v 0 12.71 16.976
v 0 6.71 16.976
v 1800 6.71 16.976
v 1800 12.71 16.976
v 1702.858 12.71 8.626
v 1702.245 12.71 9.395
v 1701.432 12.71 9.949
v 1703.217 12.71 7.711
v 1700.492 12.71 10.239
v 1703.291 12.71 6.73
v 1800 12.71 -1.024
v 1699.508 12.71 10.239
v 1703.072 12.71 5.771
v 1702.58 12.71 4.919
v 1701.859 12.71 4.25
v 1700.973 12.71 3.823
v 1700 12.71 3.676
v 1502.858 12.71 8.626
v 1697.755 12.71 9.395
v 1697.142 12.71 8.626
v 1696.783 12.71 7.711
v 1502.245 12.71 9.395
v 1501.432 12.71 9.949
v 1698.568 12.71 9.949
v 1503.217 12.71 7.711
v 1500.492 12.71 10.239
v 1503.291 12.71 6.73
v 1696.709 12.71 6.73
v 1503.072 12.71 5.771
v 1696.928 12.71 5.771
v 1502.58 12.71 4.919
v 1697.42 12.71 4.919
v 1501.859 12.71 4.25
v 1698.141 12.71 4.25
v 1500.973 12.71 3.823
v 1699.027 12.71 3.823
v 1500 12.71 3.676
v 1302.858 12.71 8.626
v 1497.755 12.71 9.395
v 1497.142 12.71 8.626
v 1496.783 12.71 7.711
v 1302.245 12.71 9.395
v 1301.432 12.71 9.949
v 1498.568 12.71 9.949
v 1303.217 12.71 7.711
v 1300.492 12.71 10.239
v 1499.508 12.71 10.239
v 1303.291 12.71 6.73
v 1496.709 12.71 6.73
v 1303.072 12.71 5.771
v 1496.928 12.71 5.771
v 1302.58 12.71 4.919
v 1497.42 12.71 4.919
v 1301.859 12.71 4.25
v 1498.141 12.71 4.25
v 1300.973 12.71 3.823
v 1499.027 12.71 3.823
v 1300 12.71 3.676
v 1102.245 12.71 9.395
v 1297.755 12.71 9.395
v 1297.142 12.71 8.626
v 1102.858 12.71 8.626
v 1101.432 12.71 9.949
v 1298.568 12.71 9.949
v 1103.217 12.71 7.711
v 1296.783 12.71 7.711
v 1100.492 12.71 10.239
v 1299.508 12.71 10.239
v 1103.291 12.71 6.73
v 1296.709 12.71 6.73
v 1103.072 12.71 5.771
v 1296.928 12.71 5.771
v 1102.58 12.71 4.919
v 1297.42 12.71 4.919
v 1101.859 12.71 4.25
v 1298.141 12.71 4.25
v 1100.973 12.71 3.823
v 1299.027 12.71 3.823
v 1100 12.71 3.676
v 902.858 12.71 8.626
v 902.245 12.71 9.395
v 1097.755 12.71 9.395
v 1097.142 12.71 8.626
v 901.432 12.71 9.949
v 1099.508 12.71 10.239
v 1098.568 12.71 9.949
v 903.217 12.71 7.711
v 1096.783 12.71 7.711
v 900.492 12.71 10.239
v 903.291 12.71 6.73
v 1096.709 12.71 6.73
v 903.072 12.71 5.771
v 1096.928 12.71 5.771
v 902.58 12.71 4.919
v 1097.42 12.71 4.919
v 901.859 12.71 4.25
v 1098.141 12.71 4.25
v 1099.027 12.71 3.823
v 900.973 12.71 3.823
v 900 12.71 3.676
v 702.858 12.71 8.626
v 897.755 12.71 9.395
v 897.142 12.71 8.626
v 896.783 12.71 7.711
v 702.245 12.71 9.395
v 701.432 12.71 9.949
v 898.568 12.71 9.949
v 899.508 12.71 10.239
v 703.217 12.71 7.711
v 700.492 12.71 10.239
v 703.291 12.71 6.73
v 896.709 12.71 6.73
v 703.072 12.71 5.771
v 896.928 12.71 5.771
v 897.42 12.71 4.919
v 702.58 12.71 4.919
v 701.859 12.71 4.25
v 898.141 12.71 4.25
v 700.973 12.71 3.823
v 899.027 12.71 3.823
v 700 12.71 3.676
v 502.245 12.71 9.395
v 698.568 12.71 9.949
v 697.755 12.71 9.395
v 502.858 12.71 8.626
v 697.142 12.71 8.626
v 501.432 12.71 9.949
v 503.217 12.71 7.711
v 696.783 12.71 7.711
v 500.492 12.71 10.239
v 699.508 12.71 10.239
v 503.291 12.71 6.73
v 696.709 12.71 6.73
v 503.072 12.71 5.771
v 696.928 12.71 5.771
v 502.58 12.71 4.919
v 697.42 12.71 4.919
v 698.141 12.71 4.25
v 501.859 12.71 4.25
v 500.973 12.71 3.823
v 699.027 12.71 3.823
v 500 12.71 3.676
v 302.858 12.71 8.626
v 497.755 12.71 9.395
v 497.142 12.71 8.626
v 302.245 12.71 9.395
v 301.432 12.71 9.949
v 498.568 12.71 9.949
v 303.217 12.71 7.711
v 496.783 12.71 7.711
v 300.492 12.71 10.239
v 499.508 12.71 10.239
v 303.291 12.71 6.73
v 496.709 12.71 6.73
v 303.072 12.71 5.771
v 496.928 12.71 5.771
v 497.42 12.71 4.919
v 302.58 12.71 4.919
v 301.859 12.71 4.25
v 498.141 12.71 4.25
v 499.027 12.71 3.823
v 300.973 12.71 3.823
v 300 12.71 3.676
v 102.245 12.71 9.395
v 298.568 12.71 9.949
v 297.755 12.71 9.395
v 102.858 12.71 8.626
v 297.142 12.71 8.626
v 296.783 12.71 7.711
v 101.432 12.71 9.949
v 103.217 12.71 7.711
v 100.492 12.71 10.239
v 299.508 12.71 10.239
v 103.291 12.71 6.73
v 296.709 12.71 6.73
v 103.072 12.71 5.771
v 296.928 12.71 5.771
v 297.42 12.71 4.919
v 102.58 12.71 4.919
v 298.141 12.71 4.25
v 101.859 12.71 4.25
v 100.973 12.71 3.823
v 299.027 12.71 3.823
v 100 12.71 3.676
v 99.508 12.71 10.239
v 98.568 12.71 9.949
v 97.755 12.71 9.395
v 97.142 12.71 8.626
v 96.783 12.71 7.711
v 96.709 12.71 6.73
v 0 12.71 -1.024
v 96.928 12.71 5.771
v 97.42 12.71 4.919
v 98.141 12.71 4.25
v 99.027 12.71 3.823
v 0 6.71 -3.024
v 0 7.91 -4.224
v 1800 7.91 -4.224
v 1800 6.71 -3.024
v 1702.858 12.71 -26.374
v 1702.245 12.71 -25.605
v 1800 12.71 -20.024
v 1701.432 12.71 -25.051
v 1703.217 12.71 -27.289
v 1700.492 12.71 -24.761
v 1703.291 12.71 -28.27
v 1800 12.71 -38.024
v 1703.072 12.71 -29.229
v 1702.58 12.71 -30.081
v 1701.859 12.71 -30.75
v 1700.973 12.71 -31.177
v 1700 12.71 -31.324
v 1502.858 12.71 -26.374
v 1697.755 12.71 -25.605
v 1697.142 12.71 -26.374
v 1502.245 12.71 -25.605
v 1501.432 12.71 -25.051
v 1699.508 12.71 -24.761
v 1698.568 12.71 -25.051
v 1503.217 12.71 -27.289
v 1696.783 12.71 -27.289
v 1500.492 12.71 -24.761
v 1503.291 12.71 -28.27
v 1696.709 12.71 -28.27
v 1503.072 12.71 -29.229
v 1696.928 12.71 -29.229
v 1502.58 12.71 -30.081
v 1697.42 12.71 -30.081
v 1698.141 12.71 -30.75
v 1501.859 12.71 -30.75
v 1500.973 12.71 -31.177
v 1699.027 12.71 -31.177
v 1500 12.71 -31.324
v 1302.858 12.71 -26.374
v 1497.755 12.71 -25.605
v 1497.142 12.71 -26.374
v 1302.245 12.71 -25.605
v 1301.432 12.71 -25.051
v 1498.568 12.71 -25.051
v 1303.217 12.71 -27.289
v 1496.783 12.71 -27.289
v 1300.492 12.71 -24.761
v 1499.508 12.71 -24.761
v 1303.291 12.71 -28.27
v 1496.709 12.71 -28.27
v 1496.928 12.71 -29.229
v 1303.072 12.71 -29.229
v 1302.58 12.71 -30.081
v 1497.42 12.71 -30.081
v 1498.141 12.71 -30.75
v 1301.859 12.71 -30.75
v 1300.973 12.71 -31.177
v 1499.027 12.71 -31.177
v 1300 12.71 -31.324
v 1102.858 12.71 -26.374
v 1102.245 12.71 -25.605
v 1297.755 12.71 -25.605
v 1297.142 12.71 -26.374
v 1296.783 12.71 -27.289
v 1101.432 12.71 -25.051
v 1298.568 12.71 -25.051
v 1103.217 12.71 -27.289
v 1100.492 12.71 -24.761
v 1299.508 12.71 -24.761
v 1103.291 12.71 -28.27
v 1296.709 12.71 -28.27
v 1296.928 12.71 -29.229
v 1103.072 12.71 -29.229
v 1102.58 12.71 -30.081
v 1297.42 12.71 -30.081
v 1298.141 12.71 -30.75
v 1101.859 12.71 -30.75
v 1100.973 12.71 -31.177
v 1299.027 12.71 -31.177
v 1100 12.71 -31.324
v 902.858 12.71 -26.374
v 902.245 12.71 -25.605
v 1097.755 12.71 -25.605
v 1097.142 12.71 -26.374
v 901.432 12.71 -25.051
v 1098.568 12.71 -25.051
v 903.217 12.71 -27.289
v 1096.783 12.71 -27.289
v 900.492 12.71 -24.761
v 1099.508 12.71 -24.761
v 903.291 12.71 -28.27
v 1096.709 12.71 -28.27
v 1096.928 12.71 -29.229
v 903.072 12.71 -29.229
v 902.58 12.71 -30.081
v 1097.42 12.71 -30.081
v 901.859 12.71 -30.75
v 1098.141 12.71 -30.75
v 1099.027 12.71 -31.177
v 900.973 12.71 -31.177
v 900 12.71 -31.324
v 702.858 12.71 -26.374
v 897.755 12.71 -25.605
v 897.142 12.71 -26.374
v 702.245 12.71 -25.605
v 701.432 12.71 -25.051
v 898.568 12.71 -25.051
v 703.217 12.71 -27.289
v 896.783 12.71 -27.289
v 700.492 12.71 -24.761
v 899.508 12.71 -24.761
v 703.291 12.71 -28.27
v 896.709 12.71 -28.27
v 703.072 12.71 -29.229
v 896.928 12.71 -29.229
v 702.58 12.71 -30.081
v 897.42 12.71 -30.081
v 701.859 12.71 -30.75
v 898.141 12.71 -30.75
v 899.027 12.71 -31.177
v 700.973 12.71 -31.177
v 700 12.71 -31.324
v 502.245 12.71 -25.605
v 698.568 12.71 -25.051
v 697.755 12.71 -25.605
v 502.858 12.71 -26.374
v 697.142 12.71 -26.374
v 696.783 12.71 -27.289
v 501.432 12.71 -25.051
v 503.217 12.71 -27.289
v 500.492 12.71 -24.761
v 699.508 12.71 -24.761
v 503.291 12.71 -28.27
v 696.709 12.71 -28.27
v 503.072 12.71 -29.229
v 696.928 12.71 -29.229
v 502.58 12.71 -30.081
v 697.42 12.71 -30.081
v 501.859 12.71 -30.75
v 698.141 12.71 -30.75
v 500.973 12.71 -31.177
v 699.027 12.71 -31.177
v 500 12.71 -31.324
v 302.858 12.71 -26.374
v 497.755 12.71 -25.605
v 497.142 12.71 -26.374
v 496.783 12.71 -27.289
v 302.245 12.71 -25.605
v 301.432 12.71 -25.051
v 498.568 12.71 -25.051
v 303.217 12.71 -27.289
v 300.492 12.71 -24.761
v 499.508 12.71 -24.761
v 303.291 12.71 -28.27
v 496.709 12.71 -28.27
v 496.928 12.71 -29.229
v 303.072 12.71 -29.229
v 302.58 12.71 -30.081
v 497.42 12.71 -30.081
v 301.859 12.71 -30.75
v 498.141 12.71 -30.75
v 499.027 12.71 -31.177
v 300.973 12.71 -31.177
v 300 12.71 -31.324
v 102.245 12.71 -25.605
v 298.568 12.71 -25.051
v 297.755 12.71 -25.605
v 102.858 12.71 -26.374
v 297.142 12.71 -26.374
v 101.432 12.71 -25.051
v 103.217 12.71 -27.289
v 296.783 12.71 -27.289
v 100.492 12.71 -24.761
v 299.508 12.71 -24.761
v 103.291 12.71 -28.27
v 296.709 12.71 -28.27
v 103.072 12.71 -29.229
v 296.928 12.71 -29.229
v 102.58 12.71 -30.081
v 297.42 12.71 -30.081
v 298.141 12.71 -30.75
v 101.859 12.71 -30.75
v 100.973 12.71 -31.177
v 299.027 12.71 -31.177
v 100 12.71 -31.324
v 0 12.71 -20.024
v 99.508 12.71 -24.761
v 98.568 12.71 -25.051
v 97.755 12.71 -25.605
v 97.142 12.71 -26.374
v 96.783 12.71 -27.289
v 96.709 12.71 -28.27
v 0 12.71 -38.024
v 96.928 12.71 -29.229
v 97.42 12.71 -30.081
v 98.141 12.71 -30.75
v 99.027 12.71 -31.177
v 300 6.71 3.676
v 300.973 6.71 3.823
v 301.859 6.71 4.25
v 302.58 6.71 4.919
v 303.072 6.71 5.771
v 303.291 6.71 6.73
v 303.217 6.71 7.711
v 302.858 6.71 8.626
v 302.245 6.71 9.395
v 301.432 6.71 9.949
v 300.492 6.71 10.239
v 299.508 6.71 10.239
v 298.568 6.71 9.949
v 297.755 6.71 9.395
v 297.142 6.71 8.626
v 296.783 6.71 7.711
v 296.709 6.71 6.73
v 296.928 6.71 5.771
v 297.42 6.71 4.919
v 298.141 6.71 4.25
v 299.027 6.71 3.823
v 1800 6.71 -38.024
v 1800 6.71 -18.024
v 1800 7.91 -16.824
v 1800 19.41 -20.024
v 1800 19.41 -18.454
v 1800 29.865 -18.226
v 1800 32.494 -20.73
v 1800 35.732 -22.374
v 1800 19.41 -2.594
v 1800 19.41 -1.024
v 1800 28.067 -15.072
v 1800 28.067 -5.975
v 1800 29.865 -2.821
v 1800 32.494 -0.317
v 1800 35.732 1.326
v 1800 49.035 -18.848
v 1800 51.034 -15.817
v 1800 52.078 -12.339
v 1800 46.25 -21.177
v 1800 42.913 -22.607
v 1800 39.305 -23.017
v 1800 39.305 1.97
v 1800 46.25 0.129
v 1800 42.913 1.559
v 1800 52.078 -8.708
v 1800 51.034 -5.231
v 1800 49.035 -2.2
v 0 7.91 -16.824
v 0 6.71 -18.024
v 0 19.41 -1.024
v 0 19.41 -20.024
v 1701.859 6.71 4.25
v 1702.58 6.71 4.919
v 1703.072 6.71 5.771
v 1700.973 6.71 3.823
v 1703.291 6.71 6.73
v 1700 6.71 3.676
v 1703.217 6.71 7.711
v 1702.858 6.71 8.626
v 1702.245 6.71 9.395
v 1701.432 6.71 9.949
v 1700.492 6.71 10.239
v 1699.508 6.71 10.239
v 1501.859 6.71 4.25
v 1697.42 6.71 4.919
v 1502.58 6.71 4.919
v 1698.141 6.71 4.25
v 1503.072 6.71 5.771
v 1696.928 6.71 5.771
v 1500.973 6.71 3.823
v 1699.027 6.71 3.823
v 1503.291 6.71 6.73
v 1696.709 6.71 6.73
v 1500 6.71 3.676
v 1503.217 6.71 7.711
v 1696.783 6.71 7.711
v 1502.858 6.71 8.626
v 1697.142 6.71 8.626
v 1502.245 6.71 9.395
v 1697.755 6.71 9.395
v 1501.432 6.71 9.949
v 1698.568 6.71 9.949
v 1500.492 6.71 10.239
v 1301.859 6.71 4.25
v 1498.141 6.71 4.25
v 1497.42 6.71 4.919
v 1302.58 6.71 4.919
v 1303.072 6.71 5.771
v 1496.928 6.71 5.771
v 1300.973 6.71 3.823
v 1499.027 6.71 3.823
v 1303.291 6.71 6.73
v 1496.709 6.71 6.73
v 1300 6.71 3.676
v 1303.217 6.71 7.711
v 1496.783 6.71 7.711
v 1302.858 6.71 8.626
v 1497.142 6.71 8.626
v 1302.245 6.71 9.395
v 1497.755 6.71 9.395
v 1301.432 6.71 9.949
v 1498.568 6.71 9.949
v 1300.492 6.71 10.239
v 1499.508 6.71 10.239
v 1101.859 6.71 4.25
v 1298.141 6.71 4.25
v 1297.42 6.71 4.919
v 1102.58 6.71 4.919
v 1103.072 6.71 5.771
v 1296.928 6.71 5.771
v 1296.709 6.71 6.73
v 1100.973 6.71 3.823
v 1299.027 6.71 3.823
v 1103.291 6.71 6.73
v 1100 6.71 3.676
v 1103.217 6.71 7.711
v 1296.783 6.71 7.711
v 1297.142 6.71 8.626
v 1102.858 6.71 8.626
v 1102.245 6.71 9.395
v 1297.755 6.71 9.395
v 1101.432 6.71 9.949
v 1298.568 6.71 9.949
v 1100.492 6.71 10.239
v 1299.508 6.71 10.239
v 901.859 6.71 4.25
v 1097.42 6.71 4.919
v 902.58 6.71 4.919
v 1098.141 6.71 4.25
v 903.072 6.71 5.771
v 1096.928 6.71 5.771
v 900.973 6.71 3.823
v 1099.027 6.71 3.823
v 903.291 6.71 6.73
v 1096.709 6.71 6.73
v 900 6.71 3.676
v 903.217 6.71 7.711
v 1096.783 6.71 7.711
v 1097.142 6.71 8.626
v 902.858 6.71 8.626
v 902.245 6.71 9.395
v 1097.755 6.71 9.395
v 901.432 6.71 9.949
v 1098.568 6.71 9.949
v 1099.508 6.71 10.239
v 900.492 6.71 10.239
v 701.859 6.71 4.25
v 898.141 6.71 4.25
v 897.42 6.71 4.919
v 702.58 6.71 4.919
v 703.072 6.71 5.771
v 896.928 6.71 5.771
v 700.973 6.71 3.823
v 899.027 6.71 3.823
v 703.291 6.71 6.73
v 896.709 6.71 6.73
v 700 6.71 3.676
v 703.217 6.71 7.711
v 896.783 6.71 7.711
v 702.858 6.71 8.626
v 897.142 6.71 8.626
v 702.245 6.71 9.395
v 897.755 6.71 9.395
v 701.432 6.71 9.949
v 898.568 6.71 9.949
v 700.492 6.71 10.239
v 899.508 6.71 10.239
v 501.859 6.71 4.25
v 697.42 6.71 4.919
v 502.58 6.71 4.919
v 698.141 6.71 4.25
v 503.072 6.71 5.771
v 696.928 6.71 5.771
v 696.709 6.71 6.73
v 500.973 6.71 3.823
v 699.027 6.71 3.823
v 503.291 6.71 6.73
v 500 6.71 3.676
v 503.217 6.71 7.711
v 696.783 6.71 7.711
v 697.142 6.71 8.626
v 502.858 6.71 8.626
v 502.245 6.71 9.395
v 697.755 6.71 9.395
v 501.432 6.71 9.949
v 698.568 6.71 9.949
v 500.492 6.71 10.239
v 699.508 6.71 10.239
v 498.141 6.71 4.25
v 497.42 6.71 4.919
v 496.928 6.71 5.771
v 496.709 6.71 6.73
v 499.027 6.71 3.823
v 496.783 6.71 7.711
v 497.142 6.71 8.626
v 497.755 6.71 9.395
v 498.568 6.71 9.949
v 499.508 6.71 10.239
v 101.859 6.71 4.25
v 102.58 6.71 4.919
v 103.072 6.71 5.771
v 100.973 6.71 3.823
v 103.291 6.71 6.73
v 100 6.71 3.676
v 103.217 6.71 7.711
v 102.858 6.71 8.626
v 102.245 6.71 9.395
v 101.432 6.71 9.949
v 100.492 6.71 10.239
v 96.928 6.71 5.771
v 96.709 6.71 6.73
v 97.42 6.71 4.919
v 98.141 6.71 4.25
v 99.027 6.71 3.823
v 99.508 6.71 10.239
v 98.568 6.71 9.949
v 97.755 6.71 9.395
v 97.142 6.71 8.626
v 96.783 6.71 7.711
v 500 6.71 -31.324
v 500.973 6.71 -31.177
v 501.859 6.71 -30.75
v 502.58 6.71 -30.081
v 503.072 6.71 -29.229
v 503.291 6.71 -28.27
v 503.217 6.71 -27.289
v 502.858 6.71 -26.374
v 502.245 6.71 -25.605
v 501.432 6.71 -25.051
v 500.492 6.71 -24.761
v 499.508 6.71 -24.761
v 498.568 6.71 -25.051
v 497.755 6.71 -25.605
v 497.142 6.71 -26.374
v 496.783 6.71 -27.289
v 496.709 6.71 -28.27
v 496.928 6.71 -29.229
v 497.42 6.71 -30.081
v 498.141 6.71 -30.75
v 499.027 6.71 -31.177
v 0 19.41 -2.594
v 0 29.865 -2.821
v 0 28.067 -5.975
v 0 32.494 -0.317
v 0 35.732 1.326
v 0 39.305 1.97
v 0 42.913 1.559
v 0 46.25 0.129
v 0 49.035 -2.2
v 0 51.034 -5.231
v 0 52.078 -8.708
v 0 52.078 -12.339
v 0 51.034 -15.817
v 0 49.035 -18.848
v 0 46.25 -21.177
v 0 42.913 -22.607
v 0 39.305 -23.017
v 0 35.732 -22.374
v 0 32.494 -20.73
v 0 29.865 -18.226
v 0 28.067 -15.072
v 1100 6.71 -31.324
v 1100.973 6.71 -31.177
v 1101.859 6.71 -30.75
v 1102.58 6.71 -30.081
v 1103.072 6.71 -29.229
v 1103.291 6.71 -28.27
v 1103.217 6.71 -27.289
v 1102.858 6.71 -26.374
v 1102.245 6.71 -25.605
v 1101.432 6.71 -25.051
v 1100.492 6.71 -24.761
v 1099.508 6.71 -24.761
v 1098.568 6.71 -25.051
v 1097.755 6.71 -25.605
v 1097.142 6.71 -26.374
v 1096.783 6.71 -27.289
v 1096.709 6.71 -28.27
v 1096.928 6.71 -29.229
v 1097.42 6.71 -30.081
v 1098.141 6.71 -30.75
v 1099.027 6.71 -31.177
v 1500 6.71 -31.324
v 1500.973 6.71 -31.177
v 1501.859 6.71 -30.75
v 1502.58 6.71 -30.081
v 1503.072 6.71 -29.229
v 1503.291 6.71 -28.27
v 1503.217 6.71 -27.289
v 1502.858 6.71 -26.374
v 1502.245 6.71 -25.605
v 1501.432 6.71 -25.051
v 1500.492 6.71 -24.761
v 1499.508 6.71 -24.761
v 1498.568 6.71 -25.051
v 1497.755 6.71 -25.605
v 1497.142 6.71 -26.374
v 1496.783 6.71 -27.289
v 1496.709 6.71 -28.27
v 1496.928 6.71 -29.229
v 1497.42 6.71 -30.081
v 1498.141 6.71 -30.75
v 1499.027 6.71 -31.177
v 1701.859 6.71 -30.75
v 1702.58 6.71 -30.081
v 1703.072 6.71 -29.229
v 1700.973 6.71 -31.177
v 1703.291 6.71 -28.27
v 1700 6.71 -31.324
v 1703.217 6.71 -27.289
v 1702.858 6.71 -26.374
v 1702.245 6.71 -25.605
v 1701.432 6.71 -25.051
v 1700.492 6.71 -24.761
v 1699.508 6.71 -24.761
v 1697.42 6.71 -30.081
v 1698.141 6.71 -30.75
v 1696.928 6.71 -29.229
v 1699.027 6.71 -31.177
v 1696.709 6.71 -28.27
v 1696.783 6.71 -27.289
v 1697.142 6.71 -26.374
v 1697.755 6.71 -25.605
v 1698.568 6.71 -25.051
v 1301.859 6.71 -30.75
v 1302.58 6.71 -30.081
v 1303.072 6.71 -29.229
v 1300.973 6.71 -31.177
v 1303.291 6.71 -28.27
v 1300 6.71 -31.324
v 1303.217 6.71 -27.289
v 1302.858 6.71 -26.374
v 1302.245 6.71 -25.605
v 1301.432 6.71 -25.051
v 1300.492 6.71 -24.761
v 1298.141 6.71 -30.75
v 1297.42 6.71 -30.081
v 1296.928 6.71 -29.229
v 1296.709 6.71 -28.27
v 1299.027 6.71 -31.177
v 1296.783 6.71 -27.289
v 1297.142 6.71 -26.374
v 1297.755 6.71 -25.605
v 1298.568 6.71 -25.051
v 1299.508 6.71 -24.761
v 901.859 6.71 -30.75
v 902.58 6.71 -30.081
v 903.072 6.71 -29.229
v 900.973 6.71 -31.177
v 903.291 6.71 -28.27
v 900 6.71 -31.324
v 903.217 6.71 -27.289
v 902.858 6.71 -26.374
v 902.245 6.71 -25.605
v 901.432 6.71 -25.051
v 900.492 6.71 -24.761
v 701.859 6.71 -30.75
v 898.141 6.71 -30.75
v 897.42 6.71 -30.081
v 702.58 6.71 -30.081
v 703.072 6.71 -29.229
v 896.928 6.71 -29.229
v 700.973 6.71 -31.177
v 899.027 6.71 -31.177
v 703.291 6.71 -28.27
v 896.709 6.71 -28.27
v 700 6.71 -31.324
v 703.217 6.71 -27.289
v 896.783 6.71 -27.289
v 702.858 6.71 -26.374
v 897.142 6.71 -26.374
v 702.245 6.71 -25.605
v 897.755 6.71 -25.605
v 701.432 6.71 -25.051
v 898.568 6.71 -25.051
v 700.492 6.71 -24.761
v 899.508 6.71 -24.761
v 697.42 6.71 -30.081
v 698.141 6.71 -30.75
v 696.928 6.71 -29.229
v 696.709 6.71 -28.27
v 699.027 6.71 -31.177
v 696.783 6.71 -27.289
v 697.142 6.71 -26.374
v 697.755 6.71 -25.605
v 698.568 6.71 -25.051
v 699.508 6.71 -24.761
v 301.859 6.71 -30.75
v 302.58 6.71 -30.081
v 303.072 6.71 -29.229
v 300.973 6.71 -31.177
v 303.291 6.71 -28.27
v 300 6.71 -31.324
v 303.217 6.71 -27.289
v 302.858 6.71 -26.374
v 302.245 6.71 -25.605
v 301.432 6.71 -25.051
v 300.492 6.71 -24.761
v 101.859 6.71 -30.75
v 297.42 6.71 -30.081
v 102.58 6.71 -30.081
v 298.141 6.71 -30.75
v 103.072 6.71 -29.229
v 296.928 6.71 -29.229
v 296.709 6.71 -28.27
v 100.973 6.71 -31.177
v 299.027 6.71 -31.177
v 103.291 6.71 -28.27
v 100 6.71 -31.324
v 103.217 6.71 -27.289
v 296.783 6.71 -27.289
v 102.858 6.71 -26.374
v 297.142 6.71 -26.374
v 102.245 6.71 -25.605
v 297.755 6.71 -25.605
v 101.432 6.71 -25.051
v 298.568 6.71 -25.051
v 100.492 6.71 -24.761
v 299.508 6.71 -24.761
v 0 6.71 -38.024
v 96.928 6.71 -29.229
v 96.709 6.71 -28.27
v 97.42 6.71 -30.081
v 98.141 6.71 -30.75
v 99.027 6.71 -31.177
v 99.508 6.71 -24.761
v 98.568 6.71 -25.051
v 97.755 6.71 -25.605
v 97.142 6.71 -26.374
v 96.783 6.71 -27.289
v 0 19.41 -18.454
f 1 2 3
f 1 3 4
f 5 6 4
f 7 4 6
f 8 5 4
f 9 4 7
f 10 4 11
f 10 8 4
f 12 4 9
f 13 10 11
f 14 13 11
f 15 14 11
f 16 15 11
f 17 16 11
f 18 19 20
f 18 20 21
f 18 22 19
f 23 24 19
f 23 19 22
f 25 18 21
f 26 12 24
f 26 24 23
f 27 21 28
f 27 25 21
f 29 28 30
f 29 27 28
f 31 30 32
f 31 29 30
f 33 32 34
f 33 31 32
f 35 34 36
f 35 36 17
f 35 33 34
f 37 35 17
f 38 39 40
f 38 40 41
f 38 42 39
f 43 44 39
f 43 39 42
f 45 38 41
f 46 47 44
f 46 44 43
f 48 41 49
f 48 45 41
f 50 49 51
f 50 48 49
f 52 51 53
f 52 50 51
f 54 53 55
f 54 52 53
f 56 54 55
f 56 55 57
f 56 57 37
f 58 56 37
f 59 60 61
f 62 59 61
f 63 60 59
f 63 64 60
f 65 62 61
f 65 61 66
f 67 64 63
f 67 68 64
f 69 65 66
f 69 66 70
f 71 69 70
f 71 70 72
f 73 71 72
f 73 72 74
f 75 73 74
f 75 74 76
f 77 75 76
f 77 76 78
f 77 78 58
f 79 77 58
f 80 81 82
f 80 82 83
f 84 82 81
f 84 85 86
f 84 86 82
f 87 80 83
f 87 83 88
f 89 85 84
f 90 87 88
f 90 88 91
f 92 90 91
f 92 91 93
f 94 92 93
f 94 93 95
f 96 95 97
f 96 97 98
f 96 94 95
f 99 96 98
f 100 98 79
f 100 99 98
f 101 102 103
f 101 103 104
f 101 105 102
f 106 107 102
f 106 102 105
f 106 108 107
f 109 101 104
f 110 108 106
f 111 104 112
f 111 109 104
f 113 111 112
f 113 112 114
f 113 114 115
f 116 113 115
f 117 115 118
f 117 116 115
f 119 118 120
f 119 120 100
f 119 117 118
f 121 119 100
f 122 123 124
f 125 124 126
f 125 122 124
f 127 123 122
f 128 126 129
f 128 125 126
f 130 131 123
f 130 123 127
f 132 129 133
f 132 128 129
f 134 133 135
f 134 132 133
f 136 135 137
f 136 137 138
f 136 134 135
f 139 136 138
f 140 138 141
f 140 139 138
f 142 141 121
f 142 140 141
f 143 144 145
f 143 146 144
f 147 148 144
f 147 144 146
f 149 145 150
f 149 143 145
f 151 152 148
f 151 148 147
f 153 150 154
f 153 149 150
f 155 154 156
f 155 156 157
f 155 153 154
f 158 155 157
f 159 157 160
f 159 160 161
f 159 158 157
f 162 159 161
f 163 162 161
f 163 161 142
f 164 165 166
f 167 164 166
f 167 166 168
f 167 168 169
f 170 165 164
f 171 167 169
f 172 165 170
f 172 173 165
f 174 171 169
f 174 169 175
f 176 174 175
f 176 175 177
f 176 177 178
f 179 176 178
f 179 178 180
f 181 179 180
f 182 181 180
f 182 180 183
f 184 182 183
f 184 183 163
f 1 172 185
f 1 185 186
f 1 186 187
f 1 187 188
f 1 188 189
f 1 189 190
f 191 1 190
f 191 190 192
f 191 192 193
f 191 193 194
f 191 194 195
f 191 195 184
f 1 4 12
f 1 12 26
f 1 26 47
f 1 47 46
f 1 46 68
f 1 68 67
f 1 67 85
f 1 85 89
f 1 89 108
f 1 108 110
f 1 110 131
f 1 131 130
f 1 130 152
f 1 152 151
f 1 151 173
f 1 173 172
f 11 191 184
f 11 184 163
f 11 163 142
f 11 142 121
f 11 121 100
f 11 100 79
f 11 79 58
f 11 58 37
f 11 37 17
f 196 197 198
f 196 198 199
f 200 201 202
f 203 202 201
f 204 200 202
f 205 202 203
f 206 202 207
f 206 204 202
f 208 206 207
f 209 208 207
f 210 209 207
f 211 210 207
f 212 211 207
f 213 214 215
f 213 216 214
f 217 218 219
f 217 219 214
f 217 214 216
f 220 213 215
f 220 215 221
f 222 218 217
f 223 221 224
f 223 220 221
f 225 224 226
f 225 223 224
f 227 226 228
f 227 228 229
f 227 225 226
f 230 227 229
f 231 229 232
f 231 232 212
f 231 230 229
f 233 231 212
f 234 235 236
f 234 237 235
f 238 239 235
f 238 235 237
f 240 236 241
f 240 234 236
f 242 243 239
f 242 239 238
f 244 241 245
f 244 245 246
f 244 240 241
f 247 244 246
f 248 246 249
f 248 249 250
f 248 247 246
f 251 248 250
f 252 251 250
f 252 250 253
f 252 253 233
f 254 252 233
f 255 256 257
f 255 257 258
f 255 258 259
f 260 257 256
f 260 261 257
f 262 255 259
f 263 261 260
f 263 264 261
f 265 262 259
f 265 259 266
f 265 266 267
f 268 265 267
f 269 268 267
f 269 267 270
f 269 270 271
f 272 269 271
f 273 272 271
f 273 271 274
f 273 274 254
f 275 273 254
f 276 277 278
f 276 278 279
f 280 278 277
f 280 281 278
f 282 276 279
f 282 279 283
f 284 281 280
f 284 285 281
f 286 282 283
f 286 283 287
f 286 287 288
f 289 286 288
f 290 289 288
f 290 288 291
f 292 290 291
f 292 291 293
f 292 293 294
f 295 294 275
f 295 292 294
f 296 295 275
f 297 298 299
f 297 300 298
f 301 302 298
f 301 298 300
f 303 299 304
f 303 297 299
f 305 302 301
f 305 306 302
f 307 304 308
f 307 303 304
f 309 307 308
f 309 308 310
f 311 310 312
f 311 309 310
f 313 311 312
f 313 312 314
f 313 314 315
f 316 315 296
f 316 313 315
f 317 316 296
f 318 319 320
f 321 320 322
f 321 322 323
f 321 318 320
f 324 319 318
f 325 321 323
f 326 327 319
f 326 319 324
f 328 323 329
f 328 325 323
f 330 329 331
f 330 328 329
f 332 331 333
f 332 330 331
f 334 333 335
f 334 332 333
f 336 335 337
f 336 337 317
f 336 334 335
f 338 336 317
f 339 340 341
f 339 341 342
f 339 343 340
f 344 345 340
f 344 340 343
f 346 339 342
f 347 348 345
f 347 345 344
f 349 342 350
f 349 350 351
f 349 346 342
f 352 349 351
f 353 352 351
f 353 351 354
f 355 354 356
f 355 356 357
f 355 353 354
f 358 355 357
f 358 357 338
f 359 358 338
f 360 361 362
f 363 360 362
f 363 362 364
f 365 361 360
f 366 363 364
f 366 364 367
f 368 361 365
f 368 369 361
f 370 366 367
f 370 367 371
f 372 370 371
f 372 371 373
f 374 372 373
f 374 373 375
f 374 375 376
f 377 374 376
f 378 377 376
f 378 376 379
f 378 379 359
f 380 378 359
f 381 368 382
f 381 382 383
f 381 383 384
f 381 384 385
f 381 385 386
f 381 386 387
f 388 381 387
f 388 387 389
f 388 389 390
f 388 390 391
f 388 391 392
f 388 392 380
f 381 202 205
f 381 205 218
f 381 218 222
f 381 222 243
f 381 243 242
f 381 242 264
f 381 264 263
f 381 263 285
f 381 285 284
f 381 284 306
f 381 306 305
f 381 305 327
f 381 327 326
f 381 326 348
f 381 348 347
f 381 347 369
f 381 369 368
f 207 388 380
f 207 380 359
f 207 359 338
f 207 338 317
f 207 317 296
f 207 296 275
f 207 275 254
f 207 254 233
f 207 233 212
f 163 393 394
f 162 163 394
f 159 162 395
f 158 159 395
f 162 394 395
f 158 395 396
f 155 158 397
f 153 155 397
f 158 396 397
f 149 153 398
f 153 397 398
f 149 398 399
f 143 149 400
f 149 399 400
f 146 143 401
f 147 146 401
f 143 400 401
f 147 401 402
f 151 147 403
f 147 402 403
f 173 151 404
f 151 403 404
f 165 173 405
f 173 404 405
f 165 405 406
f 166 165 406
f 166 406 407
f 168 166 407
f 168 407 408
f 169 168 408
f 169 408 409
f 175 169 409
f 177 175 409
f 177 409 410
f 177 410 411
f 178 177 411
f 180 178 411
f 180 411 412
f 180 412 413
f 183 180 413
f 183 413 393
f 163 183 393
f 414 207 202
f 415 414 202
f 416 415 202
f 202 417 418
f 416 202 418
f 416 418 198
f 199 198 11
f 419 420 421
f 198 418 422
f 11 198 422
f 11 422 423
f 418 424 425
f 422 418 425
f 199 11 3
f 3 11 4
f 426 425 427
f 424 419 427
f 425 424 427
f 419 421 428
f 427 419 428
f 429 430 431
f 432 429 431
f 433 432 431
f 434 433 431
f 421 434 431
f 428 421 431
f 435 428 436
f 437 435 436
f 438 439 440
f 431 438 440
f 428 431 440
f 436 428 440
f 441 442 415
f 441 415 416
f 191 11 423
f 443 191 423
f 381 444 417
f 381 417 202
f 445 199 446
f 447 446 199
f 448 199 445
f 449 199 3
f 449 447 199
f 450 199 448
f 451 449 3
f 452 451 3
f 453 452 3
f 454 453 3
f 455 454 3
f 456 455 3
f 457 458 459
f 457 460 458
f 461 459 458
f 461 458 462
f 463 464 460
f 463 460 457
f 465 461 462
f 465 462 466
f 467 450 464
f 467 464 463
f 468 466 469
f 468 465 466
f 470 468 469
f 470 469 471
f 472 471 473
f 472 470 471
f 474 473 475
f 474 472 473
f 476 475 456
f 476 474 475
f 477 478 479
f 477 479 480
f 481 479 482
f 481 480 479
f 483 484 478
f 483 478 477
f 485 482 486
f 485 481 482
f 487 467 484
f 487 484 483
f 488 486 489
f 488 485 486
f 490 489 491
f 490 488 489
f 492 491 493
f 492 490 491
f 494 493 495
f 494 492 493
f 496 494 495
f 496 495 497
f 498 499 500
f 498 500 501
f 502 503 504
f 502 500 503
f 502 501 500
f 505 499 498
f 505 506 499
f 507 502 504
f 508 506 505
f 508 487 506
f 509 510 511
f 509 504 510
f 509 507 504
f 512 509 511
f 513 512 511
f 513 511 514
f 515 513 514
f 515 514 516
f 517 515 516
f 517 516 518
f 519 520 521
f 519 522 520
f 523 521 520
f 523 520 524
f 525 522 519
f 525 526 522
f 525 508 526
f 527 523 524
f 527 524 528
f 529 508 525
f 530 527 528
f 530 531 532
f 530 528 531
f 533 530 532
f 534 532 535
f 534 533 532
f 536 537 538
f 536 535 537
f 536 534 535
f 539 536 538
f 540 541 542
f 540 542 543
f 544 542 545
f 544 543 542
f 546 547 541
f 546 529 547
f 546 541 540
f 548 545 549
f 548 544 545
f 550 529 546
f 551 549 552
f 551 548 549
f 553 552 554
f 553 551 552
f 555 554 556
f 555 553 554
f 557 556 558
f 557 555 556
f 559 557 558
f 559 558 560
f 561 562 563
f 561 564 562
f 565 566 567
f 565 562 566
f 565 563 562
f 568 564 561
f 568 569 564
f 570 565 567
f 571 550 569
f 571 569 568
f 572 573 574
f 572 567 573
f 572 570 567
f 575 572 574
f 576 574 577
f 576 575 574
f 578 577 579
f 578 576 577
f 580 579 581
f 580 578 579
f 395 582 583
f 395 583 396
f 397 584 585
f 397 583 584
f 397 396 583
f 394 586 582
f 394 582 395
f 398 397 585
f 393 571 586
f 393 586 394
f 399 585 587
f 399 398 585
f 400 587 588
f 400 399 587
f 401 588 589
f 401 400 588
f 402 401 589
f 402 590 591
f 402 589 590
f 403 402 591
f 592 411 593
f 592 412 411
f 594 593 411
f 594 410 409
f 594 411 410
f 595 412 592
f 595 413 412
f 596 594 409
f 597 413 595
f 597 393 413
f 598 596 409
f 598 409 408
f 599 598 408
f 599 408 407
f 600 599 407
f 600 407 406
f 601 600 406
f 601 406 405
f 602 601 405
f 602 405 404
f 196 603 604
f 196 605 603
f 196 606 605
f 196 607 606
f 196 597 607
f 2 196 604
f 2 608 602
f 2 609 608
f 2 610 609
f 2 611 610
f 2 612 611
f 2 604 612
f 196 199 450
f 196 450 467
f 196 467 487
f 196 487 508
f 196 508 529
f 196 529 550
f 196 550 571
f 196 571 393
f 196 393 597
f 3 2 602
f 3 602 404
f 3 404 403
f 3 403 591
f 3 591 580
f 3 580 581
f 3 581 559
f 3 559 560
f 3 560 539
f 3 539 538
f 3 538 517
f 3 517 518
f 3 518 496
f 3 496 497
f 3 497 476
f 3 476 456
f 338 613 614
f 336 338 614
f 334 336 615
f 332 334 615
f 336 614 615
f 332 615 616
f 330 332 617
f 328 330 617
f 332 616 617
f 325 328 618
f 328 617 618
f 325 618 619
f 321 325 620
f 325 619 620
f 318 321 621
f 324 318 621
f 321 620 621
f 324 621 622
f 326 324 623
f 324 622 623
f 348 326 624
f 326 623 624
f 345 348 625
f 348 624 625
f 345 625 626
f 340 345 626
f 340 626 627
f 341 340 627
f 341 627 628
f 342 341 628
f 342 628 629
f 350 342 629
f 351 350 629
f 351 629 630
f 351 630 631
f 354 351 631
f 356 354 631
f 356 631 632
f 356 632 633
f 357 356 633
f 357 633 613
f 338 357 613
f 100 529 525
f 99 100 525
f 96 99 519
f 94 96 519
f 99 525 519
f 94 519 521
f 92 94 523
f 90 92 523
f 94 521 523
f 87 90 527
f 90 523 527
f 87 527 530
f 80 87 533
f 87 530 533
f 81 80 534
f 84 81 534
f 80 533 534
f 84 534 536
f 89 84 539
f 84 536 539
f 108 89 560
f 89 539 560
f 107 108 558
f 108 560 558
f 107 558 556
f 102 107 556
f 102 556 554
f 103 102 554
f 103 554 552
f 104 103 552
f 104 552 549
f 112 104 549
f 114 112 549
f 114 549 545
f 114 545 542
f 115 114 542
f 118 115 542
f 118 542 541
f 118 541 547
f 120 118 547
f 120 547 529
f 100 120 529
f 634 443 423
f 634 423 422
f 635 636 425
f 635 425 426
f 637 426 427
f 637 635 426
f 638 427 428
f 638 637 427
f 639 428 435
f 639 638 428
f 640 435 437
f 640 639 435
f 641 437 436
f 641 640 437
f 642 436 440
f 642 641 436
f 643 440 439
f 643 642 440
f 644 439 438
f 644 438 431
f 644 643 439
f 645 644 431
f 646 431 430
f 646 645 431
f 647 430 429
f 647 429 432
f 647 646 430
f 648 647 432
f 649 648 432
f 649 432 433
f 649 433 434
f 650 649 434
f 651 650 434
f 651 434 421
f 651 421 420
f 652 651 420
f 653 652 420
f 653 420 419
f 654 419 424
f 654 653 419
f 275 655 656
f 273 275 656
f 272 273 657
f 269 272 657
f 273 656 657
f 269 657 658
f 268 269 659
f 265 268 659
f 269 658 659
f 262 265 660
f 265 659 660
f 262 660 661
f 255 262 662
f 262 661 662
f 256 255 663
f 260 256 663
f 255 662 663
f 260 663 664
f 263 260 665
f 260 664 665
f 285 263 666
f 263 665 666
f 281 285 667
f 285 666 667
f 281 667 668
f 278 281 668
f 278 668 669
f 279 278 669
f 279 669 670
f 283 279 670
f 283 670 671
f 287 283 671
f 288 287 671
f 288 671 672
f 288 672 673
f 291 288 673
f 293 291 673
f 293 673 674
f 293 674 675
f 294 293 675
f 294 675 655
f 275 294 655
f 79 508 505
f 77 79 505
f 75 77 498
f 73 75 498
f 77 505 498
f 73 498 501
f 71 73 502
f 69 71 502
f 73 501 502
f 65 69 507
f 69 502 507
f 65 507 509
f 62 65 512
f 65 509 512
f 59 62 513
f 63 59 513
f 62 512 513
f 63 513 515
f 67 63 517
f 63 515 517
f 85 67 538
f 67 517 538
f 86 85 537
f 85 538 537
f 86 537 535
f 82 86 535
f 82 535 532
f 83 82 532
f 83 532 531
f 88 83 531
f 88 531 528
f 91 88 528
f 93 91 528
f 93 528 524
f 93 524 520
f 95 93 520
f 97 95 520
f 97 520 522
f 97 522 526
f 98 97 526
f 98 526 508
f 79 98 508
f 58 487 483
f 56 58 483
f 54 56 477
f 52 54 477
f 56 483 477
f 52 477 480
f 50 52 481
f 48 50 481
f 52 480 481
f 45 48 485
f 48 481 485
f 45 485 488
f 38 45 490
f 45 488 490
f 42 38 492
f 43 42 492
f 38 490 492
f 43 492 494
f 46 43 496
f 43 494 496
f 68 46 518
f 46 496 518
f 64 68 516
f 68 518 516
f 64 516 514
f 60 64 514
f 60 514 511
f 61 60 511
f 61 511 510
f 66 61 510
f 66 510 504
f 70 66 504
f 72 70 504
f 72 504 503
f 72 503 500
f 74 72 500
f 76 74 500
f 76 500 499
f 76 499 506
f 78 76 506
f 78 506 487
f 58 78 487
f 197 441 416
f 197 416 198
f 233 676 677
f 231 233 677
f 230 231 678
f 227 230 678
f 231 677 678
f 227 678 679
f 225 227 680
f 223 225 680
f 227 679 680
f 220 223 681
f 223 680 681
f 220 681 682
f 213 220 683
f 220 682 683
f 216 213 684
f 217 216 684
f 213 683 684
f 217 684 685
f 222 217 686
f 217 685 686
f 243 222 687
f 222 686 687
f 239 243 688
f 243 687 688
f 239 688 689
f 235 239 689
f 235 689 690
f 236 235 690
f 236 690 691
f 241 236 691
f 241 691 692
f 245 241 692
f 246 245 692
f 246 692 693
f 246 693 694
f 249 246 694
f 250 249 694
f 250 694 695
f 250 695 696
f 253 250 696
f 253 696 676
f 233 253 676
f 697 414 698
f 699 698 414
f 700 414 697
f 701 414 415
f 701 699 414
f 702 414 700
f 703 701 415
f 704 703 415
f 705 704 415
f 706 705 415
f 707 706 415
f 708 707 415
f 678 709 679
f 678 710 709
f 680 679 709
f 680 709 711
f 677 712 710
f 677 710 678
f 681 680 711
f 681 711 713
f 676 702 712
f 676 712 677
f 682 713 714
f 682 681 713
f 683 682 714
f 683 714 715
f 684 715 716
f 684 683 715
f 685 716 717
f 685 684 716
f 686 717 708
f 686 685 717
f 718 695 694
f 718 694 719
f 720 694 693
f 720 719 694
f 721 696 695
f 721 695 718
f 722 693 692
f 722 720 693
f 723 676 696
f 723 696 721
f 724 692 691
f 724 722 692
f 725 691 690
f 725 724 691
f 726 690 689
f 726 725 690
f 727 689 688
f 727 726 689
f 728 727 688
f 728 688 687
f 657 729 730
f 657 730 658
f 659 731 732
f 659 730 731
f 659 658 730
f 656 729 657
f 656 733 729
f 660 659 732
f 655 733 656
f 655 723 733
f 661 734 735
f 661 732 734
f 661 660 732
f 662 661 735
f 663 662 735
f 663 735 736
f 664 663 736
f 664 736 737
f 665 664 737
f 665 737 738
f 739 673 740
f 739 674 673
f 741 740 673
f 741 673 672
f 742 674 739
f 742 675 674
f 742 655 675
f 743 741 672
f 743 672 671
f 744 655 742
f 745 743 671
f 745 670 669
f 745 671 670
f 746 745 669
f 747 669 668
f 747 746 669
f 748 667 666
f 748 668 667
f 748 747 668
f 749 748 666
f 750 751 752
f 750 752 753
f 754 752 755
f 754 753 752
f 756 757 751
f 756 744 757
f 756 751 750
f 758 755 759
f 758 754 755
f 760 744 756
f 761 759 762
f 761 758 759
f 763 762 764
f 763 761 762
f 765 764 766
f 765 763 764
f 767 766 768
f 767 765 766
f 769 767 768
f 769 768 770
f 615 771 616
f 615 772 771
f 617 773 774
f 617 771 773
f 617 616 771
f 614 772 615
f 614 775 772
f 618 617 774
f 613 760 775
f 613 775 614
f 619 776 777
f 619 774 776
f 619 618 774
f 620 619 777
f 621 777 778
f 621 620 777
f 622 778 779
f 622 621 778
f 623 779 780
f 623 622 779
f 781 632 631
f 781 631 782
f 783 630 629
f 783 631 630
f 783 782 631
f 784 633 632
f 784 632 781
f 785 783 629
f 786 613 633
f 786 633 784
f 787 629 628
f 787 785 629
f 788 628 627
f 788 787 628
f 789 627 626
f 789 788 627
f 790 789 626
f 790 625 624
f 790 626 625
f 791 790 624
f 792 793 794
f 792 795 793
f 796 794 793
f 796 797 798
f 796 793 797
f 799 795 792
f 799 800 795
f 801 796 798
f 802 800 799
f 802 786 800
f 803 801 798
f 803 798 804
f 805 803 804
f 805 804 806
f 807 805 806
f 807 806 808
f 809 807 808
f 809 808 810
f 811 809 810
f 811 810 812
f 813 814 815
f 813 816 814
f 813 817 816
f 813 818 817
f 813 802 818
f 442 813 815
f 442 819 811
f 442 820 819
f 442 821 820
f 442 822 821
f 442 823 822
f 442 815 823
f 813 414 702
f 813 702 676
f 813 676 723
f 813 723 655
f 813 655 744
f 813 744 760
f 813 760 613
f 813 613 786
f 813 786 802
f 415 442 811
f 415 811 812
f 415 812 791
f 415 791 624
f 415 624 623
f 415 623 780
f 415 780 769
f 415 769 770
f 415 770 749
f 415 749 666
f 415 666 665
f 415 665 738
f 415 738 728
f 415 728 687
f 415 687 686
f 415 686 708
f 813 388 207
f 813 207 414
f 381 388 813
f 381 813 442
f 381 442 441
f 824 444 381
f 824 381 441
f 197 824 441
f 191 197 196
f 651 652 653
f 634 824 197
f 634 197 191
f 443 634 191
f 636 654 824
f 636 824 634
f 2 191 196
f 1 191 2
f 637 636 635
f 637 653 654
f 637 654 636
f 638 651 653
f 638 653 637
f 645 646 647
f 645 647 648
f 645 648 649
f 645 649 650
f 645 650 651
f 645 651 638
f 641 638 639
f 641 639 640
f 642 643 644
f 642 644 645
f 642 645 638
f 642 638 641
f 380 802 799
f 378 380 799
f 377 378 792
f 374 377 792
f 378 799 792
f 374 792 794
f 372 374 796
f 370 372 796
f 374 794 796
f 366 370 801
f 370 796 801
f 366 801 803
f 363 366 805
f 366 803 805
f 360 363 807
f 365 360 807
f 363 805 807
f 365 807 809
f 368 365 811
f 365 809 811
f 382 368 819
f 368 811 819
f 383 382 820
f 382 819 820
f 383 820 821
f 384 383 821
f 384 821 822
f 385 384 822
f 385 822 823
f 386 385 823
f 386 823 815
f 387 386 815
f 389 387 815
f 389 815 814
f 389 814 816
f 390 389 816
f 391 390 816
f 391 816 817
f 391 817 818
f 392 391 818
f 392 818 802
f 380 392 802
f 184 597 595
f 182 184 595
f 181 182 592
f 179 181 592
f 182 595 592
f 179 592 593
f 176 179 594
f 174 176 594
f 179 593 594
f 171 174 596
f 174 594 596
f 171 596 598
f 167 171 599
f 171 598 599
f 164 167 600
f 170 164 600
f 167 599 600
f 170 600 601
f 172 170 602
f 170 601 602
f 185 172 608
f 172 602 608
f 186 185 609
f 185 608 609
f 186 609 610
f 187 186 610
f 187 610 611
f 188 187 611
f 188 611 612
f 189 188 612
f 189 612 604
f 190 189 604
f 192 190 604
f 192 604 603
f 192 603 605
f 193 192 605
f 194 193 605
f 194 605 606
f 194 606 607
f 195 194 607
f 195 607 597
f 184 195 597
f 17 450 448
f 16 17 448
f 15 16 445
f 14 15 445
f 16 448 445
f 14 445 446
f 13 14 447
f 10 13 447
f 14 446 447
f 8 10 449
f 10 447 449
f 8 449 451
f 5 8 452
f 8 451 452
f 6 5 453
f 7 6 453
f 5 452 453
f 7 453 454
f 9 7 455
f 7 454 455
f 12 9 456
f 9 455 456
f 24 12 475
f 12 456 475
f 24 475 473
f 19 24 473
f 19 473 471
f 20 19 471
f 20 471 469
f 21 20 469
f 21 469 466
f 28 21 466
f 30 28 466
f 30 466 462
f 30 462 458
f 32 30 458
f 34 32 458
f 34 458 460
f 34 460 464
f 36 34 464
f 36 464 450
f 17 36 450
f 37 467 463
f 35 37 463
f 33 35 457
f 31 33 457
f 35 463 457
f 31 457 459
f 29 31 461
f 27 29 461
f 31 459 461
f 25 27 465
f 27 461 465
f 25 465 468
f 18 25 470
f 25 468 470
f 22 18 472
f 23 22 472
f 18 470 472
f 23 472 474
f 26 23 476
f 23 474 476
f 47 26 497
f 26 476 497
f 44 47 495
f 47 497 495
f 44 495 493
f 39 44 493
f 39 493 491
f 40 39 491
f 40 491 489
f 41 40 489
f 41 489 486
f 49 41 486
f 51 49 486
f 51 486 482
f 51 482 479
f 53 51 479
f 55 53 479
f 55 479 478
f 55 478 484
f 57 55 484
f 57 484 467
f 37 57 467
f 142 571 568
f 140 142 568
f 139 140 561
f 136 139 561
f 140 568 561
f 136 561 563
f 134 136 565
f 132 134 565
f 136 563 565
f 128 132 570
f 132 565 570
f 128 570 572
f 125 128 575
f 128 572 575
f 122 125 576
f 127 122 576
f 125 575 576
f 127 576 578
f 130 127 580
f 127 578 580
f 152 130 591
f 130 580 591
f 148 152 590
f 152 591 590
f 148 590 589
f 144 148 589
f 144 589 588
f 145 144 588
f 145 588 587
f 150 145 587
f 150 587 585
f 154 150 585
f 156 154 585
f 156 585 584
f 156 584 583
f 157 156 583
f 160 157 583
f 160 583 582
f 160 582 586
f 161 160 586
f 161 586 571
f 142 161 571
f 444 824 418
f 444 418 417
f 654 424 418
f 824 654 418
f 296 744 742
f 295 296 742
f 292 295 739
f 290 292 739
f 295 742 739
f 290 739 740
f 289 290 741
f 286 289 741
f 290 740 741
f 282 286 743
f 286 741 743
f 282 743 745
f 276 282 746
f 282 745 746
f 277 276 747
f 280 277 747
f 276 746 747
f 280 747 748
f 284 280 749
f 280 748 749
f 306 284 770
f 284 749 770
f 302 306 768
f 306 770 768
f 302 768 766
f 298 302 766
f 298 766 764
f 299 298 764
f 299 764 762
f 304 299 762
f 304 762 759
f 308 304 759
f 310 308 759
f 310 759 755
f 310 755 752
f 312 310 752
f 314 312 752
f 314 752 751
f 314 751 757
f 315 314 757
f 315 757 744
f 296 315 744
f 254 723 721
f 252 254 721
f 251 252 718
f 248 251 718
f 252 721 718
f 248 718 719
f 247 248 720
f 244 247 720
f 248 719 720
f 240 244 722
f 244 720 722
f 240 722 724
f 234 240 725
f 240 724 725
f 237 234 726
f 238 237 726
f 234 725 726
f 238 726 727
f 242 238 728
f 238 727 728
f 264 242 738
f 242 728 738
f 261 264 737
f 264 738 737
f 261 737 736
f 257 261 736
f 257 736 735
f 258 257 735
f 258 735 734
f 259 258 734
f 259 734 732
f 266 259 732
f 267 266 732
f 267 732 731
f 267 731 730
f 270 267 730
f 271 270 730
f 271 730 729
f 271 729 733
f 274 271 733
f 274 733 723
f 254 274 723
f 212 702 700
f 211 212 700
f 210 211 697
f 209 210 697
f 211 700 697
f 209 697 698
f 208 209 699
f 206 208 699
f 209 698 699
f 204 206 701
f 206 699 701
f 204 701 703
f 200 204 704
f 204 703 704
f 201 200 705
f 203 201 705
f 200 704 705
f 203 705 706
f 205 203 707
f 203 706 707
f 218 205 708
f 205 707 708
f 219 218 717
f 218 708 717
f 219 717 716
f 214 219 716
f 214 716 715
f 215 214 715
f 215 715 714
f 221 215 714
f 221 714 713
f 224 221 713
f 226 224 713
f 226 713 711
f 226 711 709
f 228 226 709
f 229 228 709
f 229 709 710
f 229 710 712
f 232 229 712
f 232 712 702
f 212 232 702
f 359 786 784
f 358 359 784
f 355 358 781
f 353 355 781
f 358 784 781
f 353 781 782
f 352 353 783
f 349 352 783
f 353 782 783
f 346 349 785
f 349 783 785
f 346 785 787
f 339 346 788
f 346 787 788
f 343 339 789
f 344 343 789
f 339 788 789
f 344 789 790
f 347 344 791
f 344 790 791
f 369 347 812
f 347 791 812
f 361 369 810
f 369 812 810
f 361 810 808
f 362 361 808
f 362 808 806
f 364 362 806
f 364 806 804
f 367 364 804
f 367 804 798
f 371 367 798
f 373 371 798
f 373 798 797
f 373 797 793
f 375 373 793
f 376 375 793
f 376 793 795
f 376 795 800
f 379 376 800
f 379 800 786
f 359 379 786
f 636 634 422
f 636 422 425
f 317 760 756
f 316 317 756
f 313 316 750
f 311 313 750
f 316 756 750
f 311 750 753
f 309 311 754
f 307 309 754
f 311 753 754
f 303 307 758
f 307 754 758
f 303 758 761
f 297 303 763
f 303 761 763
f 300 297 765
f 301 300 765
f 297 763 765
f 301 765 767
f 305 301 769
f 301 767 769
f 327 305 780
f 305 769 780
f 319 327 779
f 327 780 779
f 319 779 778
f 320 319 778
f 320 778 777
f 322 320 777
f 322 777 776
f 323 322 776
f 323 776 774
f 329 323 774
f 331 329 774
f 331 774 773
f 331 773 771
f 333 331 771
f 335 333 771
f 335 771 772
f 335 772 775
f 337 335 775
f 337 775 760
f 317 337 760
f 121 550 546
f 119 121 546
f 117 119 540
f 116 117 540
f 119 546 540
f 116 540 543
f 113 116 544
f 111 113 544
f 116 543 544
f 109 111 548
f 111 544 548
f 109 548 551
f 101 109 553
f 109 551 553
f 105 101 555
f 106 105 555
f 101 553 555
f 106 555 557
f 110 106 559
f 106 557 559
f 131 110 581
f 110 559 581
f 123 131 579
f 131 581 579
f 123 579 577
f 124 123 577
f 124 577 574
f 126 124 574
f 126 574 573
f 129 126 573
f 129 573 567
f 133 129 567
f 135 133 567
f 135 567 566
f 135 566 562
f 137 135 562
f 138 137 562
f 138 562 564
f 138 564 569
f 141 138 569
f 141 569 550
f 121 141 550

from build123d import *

# Parameters (mm, degrees)
EXTRUDE_1_DEPTH         = 1800
HOLE_WIZARD_6_6_6_6_1_D = 6.6
PATTERN_LINEAR_1_COUNT  = 9
PATTERN_LINEAR_1_PITCH  = 200


with BuildPart() as part:
    # 草图1 → 凸台-拉伸1 (new body)
    with BuildSketch(Plane(origin=(0, 0, 0), x_dir=(0, 0, -1), z_dir=(1, 0, 0))):
        with BuildLine():
            Line((38.023703704, 12.710240583), (38.023703704, 6.710240583))
            Line((38.023703704, 6.710240583), (18.023703704, 6.710240583))
            Line((18.023703704, 6.710240583), (16.823703704, 7.910240583))
            Line((16.823703704, 7.910240583), (4.223703704, 7.910240583))
            Line((4.223703704, 7.910240583), (3.023703704, 6.710240583))
            Line((3.023703704, 6.710240583), (-16.976296296, 6.710240583))
            Line((-16.976296296, 6.710240583), (-16.976296296, 12.710240583))
            Line((-16.976296296, 12.710240583), (1.023703704, 12.710240583))
            Line((1.023703704, 12.710240583), (1.023703704, 19.410240583))
            Line((1.023703704, 19.410240583), (2.593703704, 19.410240583))
            Line((2.593703704, 19.410240583), (5.975416608, 28.06708446))
            ThreePointArc((5.975416608, 28.06708446), (10.523703704, 52.210240583), (15.0719908, 28.06708446))
            Line((15.0719908, 28.06708446), (18.453703704, 19.410240583))
            Line((18.453703704, 19.410240583), (20.023703704, 19.410240583))
            Line((20.023703704, 19.410240583), (20.023703704, 12.710240583))
            Line((20.023703704, 12.710240583), (38.023703704, 12.710240583))
        make_face()
    extrude(amount=EXTRUDE_1_DEPTH)

    # Ø6.6 (6.6) 直径孔1 (through all)
    with Locations(Plane(origin=(100, 12.710240583, -28.023703704), x_dir=(0, 0, 1), z_dir=(0, 1, 0))):
        with Locations((0, 0), (35, 0)):
            hole_wizard_6_6_6_6_1 = Hole(HOLE_WIZARD_6_6_6_6_1_D / 2)

    # 阵列(线性)1: Ø6.6 (6.6) 直径孔1 ×9
    with Locations(*[(i * PATTERN_LINEAR_1_PITCH, 0, 0) for i in range(1, PATTERN_LINEAR_1_COUNT)]):
        add(hole_wizard_6_6_6_6_1, mode=Mode.SUBTRACT)


solid = part.part
